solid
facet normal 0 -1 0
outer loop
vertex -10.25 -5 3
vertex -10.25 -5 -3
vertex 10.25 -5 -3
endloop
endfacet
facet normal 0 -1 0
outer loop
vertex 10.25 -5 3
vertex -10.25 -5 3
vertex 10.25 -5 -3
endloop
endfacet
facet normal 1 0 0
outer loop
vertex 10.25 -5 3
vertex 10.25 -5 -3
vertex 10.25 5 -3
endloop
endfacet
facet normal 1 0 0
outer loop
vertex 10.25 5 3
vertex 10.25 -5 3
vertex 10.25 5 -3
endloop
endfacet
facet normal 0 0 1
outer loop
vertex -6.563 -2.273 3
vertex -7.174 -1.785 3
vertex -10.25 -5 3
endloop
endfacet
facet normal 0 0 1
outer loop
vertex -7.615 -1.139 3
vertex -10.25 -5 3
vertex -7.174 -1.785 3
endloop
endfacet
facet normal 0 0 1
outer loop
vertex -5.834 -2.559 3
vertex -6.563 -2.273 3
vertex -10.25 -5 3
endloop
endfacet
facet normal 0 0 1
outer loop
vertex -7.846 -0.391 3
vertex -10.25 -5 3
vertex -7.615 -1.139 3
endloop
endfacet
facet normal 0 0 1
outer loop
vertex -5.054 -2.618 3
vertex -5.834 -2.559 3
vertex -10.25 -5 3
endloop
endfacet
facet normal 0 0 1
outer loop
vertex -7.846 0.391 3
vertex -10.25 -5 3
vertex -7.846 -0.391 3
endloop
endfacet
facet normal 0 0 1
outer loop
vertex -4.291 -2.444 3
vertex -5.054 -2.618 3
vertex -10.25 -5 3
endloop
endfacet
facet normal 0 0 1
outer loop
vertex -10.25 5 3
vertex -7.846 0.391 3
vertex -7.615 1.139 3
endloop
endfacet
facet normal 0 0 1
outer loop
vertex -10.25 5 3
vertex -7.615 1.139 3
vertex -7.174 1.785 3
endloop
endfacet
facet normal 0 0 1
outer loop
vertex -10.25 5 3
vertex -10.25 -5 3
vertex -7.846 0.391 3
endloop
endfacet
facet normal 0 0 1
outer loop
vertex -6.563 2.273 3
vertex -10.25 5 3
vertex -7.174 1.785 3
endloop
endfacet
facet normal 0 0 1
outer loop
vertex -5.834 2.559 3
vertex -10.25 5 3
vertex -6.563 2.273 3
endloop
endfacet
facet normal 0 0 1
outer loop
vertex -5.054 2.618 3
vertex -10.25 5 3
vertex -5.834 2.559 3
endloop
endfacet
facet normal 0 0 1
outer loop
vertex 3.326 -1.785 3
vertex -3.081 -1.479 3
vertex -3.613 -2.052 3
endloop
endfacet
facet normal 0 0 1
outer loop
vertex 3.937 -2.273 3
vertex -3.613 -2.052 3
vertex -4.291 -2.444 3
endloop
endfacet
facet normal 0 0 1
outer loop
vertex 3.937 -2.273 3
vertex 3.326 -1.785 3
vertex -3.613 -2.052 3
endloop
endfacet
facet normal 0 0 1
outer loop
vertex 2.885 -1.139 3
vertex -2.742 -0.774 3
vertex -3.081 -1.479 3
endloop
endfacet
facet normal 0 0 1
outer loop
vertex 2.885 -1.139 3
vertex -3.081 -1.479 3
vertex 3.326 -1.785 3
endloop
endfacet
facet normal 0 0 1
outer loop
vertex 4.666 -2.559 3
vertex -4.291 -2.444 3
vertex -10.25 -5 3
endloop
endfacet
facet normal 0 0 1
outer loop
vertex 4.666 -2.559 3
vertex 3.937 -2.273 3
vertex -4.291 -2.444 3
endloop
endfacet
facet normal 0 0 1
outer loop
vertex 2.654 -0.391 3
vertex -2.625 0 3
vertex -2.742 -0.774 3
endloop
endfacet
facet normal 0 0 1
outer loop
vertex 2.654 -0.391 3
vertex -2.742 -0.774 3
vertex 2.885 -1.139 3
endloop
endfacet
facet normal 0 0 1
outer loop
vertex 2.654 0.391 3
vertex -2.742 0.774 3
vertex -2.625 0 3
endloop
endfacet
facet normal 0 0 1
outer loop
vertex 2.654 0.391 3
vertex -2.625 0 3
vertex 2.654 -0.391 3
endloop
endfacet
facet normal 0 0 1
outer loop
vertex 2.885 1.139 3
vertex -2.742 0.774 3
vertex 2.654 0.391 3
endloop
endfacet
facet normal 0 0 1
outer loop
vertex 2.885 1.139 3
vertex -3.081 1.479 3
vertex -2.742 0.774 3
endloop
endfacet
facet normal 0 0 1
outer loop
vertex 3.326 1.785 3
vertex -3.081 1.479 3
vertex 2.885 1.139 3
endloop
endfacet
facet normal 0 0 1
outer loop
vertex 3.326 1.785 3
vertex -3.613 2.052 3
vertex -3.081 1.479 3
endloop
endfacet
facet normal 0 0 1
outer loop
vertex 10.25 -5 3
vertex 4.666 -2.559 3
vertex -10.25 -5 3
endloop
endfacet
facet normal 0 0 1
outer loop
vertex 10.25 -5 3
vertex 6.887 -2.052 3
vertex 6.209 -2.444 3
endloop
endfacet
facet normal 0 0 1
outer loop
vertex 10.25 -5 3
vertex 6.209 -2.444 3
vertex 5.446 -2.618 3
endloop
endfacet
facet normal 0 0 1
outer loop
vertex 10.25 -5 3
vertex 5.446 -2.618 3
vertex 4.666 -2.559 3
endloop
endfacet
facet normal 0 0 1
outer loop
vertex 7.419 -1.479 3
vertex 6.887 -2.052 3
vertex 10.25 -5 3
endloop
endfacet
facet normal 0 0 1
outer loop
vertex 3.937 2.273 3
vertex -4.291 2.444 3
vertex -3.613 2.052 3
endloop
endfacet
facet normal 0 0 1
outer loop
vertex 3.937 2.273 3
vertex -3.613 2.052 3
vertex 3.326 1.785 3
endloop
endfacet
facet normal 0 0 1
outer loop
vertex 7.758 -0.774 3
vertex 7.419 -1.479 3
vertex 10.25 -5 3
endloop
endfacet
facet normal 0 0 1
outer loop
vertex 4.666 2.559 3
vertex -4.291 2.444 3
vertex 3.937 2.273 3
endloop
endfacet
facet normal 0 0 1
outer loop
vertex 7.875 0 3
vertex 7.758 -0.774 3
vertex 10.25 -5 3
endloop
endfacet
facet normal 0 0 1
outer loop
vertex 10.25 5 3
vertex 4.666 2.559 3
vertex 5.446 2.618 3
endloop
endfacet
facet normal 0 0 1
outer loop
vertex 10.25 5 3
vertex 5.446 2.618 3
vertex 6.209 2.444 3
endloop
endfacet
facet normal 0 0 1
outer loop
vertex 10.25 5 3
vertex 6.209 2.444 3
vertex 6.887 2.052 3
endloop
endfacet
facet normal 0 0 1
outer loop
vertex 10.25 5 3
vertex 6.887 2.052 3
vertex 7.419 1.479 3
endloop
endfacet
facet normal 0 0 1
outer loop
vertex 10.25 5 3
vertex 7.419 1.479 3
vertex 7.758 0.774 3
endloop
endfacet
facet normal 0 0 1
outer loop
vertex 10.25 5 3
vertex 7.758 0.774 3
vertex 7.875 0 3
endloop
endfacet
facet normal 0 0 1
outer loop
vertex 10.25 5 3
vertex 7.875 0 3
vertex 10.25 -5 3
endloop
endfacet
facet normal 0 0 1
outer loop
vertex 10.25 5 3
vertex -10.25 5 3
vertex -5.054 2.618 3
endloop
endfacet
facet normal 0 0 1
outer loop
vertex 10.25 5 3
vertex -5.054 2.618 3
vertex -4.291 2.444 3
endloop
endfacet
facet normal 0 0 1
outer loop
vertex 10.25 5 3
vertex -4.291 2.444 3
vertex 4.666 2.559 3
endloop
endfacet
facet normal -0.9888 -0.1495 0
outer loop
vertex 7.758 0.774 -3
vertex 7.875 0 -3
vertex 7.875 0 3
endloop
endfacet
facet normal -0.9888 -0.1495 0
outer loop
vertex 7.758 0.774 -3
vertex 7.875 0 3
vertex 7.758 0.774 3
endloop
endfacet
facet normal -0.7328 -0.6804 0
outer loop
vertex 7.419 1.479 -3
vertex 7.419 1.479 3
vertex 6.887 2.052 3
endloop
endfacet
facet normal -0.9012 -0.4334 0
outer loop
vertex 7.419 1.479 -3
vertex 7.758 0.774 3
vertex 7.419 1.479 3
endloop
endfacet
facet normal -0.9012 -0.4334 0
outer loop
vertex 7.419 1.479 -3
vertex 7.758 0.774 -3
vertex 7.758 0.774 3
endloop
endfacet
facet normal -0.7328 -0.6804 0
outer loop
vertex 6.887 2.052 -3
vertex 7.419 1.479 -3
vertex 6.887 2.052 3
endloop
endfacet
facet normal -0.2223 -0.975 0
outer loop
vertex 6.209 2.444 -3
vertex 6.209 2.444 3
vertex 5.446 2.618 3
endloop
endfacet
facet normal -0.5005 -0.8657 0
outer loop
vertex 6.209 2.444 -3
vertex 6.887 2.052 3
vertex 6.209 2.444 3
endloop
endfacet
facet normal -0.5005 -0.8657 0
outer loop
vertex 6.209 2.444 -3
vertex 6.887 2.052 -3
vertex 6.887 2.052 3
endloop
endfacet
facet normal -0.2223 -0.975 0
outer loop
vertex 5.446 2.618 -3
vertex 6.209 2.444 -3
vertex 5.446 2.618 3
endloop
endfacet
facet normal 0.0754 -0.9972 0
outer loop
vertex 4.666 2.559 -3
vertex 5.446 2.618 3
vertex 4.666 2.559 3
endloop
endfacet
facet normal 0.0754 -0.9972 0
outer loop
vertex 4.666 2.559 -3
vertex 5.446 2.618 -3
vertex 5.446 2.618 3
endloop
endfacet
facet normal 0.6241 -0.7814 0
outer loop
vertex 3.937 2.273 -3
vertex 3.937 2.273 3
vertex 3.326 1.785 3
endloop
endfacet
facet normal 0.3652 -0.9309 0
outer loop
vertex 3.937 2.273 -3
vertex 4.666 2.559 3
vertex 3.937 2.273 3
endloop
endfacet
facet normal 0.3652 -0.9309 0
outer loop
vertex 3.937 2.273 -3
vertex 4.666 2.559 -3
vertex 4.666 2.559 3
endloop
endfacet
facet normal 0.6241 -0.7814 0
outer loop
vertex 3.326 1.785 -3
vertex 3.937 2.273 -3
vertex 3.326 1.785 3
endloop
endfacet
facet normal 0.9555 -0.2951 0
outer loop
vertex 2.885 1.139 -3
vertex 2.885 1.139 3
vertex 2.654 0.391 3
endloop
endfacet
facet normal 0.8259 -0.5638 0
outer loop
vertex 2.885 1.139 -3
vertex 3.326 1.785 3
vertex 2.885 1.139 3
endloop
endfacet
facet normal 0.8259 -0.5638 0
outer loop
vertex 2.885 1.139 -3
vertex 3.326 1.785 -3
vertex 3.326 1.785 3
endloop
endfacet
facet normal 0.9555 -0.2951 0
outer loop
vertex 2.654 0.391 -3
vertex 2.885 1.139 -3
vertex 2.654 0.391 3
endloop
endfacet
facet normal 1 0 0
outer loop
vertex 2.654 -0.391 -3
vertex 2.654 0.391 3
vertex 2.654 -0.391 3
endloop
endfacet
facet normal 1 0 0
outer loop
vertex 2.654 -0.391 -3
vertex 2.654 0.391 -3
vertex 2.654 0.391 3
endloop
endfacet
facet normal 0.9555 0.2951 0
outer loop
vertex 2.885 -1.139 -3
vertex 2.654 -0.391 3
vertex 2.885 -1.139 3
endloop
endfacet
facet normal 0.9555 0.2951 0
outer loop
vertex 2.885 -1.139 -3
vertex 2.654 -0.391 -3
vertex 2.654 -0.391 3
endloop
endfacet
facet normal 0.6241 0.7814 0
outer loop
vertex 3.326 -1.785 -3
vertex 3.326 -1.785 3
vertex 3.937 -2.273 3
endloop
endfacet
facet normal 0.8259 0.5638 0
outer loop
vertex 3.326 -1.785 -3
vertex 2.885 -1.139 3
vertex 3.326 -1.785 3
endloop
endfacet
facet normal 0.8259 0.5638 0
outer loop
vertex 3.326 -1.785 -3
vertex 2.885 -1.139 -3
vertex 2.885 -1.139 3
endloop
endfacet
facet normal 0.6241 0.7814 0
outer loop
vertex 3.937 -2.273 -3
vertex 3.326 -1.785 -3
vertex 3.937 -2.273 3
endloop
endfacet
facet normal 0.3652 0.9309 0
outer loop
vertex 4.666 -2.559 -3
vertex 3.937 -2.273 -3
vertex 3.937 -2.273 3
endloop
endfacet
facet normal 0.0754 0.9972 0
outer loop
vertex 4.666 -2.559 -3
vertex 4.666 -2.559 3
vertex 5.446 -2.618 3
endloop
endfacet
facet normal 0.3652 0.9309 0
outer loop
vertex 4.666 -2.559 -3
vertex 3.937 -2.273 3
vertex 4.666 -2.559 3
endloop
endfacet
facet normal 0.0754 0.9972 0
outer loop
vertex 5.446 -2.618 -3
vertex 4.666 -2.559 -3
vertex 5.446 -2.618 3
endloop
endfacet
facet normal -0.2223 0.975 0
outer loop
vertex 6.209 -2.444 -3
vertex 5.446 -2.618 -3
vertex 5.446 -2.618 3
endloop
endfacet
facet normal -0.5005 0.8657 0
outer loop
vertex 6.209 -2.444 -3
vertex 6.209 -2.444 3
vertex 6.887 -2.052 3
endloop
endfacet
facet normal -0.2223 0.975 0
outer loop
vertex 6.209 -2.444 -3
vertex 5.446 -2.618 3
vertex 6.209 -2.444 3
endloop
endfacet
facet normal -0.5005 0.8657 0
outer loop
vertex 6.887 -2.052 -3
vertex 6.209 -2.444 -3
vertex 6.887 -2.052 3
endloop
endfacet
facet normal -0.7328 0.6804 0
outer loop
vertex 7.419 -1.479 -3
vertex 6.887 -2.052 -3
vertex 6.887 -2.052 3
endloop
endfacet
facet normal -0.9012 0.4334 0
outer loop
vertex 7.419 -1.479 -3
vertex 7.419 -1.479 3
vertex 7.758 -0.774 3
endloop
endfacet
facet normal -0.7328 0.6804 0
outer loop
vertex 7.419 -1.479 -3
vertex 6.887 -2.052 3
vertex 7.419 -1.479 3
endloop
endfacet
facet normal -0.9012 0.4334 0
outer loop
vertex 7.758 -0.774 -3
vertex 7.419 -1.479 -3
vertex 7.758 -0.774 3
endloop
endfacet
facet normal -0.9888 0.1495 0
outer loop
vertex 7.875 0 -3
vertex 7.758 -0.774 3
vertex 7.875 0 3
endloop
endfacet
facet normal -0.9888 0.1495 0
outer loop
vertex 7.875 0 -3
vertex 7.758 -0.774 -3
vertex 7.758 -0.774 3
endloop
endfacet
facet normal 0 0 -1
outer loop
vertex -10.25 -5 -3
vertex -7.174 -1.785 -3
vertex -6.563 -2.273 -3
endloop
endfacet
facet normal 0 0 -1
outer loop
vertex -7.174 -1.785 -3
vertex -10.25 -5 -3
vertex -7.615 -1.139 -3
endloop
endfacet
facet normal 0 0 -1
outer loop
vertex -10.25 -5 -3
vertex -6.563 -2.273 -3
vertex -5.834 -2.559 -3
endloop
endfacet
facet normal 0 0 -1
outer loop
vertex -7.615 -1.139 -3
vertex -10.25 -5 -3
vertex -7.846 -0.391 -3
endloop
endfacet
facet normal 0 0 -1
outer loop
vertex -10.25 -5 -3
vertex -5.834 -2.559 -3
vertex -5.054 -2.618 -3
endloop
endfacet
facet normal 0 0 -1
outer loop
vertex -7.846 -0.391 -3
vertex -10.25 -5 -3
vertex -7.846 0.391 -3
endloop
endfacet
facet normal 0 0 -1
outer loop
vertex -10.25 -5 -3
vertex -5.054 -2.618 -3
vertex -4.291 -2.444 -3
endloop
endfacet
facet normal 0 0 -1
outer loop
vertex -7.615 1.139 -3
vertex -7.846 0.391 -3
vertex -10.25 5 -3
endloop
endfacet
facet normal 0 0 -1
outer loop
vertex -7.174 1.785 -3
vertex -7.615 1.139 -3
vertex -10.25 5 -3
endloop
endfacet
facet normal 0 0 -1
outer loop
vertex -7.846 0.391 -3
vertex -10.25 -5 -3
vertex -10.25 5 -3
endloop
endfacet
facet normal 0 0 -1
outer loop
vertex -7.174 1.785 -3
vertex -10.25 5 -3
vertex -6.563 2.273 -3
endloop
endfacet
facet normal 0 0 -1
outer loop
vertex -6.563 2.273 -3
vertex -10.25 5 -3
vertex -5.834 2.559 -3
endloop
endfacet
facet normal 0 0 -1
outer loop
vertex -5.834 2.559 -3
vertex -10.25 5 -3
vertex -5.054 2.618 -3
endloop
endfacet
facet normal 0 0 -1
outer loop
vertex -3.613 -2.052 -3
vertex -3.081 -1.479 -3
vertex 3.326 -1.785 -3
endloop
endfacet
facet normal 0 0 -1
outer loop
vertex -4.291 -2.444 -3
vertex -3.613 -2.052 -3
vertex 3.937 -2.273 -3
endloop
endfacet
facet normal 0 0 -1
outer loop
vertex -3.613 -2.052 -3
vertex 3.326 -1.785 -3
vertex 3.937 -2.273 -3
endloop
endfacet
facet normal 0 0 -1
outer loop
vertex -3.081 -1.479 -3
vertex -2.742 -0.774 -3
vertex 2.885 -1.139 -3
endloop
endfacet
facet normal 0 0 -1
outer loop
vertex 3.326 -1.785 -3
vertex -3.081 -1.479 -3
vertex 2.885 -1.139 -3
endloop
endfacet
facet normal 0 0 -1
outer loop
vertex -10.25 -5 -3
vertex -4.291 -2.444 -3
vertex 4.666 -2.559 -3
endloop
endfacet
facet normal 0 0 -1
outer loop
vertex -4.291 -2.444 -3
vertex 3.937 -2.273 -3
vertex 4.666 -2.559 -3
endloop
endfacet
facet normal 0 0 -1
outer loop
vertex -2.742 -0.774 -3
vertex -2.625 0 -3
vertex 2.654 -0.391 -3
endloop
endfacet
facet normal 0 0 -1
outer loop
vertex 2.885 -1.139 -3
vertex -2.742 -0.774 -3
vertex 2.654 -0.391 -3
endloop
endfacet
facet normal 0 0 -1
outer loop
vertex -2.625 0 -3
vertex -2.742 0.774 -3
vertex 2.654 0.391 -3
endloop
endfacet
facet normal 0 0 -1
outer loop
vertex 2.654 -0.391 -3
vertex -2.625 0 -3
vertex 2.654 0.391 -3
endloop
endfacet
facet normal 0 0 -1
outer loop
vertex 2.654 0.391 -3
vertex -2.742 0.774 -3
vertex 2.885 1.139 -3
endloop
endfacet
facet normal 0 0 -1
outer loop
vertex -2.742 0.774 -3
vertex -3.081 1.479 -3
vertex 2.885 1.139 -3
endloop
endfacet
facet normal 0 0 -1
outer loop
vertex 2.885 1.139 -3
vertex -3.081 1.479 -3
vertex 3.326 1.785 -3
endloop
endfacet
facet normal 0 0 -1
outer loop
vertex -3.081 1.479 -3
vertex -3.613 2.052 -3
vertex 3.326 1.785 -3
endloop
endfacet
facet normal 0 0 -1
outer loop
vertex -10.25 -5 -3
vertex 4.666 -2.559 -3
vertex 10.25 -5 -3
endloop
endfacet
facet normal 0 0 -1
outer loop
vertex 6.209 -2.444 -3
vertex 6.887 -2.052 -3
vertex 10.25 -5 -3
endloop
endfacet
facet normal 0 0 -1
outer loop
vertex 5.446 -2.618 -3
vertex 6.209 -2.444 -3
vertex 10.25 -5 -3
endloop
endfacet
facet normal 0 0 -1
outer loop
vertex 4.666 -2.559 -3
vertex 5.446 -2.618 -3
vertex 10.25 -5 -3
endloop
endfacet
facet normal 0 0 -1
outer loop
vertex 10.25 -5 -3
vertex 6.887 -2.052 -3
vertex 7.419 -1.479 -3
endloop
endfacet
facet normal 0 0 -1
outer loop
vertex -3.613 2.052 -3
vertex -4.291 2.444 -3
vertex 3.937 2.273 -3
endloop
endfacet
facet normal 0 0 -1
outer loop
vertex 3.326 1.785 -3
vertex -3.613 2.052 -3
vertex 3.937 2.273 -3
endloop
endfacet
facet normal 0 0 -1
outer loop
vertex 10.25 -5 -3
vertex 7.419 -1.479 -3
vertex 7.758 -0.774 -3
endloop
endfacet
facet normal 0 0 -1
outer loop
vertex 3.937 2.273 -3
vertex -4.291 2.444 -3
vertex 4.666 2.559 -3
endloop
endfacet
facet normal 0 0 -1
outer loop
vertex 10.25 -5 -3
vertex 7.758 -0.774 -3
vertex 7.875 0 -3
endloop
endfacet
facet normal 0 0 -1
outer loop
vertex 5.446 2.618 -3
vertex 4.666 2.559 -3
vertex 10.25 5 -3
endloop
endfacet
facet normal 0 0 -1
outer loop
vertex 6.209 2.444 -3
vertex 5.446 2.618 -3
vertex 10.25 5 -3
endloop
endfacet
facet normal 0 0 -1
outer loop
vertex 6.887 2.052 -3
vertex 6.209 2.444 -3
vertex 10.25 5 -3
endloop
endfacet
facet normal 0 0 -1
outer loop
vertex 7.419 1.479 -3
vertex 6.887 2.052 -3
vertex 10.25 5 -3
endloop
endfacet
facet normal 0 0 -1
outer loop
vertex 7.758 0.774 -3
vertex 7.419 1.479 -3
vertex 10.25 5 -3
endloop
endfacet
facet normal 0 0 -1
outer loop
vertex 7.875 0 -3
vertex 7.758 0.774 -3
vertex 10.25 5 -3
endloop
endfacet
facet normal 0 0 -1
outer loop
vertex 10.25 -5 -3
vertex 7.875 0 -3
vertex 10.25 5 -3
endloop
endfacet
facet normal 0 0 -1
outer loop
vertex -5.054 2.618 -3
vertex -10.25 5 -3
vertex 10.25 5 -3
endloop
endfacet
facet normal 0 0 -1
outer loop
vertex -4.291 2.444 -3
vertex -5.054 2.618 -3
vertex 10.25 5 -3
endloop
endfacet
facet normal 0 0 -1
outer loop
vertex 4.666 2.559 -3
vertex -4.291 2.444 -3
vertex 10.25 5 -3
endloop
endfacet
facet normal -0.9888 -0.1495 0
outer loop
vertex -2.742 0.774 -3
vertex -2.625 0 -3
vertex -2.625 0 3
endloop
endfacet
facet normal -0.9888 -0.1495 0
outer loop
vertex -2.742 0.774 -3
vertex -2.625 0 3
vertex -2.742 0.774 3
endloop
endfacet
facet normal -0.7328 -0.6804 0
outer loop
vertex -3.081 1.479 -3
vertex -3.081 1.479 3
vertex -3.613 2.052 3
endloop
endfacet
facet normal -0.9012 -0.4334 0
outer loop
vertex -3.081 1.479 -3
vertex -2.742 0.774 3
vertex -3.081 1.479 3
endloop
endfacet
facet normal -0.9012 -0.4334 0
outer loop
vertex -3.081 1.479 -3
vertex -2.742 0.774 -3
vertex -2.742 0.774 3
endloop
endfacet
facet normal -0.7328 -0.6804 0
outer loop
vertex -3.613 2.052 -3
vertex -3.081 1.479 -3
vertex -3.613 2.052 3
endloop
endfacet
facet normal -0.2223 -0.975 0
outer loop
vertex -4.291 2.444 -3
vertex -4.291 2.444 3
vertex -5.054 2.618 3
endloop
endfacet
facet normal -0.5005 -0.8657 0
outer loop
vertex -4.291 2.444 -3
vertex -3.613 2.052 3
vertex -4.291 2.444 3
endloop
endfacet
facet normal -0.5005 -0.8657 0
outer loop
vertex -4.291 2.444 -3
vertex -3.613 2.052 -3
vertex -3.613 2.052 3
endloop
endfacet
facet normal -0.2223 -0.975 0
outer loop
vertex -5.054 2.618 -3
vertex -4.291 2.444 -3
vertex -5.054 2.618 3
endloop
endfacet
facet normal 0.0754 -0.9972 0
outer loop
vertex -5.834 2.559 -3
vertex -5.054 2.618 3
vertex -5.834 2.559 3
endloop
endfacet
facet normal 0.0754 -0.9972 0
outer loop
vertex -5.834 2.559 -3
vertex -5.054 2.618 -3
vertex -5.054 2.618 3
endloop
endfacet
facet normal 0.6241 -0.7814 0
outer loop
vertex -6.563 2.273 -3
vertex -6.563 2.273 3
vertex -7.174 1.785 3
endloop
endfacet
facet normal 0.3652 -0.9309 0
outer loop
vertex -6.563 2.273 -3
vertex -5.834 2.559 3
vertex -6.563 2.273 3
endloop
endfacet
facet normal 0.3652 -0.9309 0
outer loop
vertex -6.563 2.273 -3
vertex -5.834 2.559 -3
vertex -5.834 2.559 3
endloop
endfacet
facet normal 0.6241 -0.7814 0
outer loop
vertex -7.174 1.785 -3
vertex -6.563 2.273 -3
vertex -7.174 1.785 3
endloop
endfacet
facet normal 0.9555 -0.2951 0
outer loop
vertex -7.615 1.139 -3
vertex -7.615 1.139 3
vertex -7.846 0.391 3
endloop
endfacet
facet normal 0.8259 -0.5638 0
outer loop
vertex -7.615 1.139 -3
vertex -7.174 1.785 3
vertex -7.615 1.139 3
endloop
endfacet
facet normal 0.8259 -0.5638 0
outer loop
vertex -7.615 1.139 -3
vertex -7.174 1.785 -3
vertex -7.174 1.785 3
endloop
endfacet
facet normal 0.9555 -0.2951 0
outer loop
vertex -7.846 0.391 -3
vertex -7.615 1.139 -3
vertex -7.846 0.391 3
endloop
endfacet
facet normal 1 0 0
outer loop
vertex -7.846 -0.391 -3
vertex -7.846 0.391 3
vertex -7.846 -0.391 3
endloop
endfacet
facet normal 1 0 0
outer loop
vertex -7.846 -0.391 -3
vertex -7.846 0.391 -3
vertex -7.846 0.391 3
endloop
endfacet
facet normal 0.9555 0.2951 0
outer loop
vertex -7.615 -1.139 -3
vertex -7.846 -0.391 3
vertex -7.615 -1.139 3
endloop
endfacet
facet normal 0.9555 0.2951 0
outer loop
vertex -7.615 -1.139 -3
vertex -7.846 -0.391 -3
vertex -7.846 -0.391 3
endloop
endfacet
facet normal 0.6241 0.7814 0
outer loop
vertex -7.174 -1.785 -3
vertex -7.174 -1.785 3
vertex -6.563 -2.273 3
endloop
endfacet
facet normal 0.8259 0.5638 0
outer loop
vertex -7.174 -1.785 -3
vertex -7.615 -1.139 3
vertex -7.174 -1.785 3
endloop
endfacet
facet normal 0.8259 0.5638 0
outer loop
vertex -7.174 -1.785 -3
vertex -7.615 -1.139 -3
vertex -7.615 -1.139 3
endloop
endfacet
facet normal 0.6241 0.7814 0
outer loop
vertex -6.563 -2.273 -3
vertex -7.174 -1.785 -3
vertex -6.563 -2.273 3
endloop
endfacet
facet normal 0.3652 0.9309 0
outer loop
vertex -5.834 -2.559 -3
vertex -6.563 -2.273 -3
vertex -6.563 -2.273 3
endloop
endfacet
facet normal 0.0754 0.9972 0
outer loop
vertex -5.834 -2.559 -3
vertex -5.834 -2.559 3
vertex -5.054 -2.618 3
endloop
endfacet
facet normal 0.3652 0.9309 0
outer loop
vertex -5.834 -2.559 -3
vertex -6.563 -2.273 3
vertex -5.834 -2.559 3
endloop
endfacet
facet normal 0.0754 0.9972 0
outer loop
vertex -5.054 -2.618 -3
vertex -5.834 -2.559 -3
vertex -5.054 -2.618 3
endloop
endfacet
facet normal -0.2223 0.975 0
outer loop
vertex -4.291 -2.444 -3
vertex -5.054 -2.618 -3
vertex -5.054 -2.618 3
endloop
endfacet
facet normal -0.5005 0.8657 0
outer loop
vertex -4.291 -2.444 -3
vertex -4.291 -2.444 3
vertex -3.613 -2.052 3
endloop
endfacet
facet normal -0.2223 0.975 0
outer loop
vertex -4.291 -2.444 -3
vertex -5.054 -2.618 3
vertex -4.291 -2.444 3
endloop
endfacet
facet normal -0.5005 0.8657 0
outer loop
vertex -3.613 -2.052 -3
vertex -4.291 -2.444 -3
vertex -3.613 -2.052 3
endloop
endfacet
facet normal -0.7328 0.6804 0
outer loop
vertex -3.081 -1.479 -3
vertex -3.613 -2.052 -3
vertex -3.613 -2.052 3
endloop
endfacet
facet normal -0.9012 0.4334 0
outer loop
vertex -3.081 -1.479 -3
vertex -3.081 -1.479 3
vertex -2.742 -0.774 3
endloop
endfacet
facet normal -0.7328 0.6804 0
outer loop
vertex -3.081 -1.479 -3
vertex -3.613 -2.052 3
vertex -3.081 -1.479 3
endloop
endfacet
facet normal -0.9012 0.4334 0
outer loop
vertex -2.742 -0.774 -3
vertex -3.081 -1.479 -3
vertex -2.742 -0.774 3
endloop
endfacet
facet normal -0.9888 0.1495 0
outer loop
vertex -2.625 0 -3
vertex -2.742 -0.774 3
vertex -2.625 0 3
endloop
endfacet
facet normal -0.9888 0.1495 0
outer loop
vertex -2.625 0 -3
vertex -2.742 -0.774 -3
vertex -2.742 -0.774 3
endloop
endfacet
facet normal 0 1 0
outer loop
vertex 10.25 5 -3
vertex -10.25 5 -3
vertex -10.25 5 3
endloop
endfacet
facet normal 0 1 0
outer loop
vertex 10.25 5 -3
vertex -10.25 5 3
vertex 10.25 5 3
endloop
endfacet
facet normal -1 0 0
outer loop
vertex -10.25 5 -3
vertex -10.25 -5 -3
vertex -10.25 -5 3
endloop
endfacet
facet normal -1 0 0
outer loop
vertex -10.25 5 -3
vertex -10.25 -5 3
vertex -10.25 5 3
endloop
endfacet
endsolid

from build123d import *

# Parameters (mm, degrees)
MAINBODY_EXTRUDE_START                 = -3
PROJECTIONXY_SKETCH_W                  = 20.5
PROJECTIONXY_SKETCH_H                  = 10
MAINBODY_EXTRUDE_DEPTH                 = 6
VISESCREWCLEARANCEHOLES_CUT_DEPTH      = 12.792476415
VISESCREWCLEARANCEHOLES_CUT_DEPTH_BACK = 12.792476415
VISESCREWCLEARANCEHOLES_SKETCH_R       = 2.625


with BuildPart() as part:
    # projectionXy_sketch → mainBody_extrude (new body)
    with BuildSketch(Plane.XY.offset(MAINBODY_EXTRUDE_START)):
        Rectangle(PROJECTIONXY_SKETCH_W, PROJECTIONXY_SKETCH_H)
    extrude(amount=MAINBODY_EXTRUDE_DEPTH)

    # viseScrewClearanceHoles_sketch → viseScrewClearanceHoles_cut (cut, two sides: drawn at the far end of the back side and taken through both)
    with BuildSketch(Plane.XY.offset(-VISESCREWCLEARANCEHOLES_CUT_DEPTH_BACK)):
        with Locations((-5.25, 0)):
            Circle(VISESCREWCLEARANCEHOLES_SKETCH_R)
        with Locations((5.25, 0)):
            Circle(VISESCREWCLEARANCEHOLES_SKETCH_R)
    extrude(amount=VISESCREWCLEARANCEHOLES_CUT_DEPTH + VISESCREWCLEARANCEHOLES_CUT_DEPTH_BACK, mode=Mode.SUBTRACT)


solid = part.part
